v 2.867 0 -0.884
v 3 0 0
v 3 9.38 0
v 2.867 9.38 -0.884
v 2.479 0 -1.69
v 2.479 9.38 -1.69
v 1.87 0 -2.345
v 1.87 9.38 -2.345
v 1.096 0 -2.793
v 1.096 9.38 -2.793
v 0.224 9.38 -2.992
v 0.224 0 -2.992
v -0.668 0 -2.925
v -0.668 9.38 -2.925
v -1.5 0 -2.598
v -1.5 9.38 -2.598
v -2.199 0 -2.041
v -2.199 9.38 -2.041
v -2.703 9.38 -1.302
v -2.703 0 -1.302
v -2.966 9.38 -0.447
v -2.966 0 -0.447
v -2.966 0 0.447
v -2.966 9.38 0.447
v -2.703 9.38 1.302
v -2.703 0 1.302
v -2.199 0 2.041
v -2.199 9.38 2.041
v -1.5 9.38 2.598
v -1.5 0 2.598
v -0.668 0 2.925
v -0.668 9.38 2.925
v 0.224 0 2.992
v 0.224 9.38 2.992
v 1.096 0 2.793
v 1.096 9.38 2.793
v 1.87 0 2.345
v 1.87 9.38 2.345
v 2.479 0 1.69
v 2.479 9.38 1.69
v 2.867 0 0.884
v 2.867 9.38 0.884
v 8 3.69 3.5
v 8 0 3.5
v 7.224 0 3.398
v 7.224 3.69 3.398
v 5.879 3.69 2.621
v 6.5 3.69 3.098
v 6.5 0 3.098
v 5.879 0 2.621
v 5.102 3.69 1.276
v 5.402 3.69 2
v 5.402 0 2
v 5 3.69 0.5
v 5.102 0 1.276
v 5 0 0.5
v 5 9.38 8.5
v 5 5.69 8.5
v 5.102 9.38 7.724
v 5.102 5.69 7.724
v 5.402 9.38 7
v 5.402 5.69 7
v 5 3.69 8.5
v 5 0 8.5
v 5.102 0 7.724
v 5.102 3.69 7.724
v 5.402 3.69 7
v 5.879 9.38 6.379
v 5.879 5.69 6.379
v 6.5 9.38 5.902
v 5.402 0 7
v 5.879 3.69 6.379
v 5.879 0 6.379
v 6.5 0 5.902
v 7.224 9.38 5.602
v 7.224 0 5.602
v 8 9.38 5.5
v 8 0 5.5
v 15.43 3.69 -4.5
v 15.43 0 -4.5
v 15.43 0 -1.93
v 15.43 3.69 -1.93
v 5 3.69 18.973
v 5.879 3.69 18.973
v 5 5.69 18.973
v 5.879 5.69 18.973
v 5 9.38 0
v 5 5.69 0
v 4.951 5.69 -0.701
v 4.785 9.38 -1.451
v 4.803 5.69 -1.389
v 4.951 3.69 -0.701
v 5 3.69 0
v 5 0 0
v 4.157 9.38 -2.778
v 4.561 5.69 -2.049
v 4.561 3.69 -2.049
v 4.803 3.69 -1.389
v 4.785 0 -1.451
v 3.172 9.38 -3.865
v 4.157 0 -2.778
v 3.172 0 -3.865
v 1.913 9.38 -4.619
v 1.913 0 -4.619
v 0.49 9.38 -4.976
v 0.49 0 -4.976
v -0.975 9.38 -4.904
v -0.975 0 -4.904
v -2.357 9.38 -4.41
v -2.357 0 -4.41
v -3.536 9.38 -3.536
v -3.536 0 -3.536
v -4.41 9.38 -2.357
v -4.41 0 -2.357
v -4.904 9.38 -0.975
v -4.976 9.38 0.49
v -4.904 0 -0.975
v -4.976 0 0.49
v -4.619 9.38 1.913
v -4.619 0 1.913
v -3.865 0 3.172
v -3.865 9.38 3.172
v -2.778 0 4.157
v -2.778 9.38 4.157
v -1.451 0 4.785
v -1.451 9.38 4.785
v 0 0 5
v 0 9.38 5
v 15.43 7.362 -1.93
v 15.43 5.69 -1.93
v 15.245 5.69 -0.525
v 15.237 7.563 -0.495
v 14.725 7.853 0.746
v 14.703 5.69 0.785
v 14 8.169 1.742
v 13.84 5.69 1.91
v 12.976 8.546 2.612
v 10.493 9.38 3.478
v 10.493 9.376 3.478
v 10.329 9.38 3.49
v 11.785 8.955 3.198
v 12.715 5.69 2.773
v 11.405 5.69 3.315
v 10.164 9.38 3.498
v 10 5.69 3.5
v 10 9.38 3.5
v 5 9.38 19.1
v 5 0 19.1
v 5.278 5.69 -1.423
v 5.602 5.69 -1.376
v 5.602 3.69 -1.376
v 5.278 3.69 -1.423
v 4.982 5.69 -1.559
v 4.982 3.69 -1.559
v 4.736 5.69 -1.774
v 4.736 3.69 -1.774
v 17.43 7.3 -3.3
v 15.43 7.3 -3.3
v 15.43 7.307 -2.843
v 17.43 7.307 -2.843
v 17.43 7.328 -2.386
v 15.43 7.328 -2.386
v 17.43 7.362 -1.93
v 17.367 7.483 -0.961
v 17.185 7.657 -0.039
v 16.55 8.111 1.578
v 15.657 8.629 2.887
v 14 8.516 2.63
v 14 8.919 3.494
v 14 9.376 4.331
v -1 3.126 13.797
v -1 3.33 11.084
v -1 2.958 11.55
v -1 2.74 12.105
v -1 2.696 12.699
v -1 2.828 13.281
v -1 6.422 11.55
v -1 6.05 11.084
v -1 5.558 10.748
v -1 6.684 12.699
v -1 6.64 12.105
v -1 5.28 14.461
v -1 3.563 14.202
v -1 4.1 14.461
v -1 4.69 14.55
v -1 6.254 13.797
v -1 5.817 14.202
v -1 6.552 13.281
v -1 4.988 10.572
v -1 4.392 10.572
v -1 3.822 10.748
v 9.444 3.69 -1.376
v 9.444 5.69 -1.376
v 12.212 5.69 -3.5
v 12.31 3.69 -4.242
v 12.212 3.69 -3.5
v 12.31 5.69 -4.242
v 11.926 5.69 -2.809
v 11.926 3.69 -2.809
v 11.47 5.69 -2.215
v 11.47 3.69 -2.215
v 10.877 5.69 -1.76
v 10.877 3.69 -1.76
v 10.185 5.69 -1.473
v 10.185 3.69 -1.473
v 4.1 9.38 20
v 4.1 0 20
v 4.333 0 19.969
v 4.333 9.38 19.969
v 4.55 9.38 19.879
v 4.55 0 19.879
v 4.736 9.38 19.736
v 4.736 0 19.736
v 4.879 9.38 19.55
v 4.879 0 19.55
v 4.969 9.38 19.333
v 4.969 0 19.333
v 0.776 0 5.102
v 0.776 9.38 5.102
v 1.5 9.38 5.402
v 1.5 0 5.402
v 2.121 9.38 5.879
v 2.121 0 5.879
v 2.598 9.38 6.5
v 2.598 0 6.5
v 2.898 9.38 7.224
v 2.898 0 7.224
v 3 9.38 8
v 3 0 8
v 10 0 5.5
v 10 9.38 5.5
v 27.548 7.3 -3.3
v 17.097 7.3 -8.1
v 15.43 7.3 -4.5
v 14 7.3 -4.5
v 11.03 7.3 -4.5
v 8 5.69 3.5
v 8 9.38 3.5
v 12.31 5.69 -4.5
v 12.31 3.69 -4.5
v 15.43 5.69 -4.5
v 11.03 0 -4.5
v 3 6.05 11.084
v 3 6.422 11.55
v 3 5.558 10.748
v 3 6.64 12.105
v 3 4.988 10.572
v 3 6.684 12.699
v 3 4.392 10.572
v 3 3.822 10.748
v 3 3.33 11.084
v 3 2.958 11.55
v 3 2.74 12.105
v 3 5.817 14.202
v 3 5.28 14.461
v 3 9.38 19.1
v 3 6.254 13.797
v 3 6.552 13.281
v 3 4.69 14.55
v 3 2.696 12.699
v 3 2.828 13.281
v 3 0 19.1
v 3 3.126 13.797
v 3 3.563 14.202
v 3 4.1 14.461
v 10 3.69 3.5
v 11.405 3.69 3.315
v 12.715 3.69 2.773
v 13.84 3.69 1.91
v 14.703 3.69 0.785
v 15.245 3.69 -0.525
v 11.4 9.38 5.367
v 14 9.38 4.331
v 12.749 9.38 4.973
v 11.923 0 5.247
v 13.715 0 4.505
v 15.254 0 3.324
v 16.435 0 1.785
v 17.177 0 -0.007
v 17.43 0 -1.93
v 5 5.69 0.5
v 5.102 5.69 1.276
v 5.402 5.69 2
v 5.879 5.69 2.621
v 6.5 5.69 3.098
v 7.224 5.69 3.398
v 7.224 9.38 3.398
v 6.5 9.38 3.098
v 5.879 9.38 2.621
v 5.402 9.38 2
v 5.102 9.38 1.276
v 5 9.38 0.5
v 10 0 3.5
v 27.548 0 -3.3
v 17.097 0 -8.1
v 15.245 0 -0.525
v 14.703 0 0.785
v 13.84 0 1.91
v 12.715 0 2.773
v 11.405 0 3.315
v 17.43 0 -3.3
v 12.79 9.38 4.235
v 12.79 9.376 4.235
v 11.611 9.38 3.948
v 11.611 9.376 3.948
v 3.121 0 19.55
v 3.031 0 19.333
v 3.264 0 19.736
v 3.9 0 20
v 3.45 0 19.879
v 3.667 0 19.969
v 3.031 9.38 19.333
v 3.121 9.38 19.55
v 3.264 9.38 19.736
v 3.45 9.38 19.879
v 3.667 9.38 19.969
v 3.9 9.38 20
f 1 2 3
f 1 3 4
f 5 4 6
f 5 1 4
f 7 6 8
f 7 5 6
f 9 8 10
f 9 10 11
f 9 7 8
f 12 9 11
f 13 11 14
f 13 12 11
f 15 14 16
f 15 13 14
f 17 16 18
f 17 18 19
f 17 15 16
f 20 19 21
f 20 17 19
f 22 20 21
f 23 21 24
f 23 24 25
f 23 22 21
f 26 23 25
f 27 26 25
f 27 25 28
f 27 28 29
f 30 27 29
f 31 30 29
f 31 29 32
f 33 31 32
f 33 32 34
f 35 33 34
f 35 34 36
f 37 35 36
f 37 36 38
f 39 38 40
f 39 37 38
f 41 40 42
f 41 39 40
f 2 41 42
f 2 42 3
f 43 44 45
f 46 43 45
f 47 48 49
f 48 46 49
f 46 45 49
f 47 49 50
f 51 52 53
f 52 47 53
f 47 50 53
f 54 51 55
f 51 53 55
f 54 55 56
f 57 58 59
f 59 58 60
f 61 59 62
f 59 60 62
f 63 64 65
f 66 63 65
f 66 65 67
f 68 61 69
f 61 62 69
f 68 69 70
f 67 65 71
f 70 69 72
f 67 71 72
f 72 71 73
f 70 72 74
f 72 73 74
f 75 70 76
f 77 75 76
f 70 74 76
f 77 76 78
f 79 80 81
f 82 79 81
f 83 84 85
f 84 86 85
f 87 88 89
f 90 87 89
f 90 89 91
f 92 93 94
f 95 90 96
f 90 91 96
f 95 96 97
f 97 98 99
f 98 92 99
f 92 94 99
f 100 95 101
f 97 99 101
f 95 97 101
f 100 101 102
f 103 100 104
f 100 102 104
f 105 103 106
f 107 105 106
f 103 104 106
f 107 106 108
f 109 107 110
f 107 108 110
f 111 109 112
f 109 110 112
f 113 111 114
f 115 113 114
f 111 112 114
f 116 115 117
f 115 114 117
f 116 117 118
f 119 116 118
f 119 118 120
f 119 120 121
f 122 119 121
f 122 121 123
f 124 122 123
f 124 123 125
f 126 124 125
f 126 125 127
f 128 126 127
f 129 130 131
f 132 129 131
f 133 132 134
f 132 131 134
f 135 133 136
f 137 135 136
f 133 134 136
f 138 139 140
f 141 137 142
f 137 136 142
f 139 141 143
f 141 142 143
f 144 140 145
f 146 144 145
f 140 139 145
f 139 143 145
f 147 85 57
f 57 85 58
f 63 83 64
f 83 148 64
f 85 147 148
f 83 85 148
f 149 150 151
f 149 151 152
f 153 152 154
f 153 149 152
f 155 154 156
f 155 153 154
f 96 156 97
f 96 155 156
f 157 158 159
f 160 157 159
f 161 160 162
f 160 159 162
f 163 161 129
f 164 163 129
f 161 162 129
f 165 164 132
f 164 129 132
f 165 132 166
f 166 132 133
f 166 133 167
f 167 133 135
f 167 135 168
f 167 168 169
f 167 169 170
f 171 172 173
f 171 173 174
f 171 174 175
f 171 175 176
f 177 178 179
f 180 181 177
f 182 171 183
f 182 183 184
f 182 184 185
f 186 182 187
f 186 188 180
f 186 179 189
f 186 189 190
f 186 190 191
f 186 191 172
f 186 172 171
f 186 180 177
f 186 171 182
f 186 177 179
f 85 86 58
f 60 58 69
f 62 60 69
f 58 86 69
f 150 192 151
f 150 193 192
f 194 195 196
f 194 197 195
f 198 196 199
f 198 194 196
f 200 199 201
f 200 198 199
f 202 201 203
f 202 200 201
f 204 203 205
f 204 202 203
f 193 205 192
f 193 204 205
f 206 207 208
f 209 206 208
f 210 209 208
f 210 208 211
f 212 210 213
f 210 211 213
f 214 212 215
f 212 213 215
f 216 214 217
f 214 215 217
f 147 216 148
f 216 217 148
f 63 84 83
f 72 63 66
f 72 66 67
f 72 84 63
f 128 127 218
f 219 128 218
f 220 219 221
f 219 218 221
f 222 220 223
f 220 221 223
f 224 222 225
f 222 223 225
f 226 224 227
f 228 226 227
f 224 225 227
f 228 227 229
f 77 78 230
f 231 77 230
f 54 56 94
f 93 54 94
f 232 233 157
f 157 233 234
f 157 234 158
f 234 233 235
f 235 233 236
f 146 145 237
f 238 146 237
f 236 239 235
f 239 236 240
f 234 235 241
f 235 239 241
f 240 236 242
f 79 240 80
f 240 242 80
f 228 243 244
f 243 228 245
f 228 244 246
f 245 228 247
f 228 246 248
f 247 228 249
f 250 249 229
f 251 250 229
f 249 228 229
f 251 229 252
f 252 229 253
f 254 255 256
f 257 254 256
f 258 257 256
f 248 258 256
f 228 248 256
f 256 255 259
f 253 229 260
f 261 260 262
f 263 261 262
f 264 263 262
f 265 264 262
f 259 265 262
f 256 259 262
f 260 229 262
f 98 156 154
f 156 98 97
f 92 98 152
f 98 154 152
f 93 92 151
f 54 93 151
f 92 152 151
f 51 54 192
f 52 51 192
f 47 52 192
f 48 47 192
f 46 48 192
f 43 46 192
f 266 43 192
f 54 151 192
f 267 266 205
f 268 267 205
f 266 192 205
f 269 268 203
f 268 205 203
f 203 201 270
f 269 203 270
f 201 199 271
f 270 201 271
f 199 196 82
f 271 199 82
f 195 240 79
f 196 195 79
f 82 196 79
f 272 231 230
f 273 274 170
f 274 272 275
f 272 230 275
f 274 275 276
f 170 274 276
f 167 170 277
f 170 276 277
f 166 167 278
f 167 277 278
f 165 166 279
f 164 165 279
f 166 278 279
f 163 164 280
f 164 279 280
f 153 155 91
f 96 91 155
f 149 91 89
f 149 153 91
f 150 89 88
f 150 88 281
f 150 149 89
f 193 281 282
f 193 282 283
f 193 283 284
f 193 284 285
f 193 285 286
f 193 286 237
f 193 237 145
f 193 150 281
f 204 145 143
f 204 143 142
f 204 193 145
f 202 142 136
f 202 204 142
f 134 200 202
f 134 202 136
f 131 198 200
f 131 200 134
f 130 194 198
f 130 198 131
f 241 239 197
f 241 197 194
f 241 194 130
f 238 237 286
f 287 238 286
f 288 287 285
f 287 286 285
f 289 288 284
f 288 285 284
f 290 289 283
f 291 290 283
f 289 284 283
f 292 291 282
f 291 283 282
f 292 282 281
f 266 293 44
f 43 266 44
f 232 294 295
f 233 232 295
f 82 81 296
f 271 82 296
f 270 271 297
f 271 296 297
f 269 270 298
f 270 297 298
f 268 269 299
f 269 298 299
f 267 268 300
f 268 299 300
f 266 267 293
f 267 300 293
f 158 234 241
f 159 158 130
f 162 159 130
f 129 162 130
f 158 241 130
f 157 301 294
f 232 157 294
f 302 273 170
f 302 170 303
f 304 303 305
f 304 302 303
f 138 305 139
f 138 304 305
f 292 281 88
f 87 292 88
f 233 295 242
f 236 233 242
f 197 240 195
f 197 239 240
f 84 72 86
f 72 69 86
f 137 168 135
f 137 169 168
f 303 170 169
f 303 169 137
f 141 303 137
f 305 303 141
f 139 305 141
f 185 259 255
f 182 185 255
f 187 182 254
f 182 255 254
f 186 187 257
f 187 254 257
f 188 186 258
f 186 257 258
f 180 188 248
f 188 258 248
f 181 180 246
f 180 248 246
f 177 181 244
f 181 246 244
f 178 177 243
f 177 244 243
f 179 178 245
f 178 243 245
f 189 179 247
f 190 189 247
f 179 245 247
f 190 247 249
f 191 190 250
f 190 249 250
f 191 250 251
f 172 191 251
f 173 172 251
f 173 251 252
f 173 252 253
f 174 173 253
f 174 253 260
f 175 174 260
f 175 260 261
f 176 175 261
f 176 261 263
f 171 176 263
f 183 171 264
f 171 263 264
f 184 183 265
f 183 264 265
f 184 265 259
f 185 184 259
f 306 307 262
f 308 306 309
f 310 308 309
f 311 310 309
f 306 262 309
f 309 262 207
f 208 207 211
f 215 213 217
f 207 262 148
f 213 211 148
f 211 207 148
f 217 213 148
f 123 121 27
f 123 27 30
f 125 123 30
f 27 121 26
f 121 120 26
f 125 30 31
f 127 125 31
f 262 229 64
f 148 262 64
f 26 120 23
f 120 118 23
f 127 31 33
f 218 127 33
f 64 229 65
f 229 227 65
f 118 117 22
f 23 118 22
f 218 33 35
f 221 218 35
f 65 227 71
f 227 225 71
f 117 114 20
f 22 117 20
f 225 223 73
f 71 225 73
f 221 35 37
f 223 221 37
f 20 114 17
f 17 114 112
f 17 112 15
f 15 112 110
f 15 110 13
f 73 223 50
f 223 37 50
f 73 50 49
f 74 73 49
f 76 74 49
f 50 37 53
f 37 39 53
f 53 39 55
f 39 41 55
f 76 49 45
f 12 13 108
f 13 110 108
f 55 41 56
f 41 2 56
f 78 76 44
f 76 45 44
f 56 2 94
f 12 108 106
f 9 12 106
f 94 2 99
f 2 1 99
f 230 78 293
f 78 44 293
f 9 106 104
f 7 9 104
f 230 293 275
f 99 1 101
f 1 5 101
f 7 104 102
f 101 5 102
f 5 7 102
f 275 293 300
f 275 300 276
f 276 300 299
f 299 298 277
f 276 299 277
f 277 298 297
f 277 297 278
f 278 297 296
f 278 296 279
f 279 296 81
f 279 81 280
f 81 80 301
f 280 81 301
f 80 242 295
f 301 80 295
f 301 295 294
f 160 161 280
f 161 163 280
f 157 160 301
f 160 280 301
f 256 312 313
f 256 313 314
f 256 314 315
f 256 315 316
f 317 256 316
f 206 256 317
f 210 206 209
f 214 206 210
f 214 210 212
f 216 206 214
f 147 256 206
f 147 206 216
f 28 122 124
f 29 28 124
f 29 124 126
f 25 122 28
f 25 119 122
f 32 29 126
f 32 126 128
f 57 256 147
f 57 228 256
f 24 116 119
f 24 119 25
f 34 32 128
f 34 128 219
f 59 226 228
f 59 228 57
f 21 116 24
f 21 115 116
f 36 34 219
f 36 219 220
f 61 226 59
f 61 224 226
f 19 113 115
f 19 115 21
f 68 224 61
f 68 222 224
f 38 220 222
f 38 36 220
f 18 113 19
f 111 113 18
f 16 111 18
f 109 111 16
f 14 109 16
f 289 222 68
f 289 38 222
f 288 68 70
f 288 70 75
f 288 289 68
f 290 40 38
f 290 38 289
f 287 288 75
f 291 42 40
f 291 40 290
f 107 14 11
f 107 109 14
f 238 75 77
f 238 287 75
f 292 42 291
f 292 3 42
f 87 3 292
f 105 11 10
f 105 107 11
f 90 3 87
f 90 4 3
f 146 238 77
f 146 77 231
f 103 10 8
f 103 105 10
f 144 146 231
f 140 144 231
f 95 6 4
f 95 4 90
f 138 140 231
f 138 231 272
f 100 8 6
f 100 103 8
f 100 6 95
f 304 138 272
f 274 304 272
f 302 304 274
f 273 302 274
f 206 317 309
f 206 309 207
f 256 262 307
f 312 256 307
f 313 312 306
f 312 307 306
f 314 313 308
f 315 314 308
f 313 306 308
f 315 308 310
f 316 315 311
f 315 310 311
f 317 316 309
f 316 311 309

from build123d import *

# Parameters (mm, degrees)
SKETCH1_R           = 3
BOSS_EXTRUDE1_DEPTH = 9.38
BOSS_EXTRUDE2_DEPTH = 1
SKETCH5_R           = 2
BOSS_EXTRUDE3_DEPTH = 4
BOSS_EXTRUDE4_DEPTH = 1
CUT_EXTRUDE1_DEPTH  = 15
SKETCH8_W           = 1.762177923
SKETCH8_H           = 2.08
CUT_EXTRUDE2_DEPTH  = 5
CUT_REVOLVE2_ANGLE  = 180


with BuildPart() as part:
    # Sketch1 → Boss-Extrude1 (new body)
    with BuildSketch(Plane(origin=(0, 0, 0), x_dir=(1, 0, 0), z_dir=(0, 1, 0))):
        with BuildLine():
            Line((3, -8), (3, -19.1))
            ThreePointArc((3, -19.1), (3.263603897, -19.736396103), (3.9, -20))
            Line((3.9, -20), (4.1, -20))
            ThreePointArc((4.1, -20), (4.736396103, -19.736396103), (5, -19.1))
            Line((5, -19.1), (5, -8.5))
            ThreePointArc((5, -8.5), (5.878679656, -6.378679656), (8, -5.5))
            Line((8, -5.5), (10, -5.5))
            ThreePointArc((10, -5.5), (15.253803384, -3.323803384), (17.43, 1.93))
            Line((17.43, 1.93), (17.43, 3.3))
            Line((17.43, 3.3), (27.54785059, 3.3))
            Line((27.54785059, 3.3), (17.097491745, 8.1))
            Line((17.097491745, 8.1), (11.03, 4.5))
            Line((11.03, 4.5), (15.43, 4.5))
            Line((15.43, 4.5), (15.43, 1.93))
            ThreePointArc((15.43, 1.93), (13.839589822, -1.909589822), (10, -3.5))
            Line((10, -3.5), (8, -3.5))
            ThreePointArc((8, -3.5), (5.878679656, -2.621320344), (5, -0.5))
            Line((5, -0.5), (5, 0))
            ThreePointArc((5, 0), (-3.535533906, 3.535533906), (0, -5))
            ThreePointArc((0, -5), (2.121320344, -5.878679656), (3, -8))
        make_face()
        Circle(SKETCH1_R, mode=Mode.SUBTRACT)
    extrude(amount=BOSS_EXTRUDE1_DEPTH)

    # Sketch3 → Boss-Extrude2 (add, symmetric)
    with BuildSketch(Plane(origin=(0, 4.69, 0), x_dir=(1, 0, 0), z_dir=(0, 1, 0))):
        with BuildLine():
            Line((9.443635769, 1.375812361), (5.601654611, 1.375812361))
            ThreePointArc((5.601654611, 1.375812361), (4.981779837, 1.558852726), (4.560762938, 2.04925387))
            ThreePointArc((4.560762938, 2.04925387), (4.888957695, 1.047899163), (5, 0))
            Line((5, 0), (5, -0.5))
            ThreePointArc((5, -0.5), (5.878679656, -2.621320344), (8, -3.5))
            Line((8, -3.5), (10, -3.5))
            ThreePointArc((10, -3.5), (13.839589822, -1.909589822), (15.43, 1.93))
            Line((15.43, 1.93), (15.43, 4.5))
            Line((15.43, 4.5), (12.309861007, 4.5))
            Line((12.309861007, 4.5), (12.309861007, 4.242037598))
            ThreePointArc((12.309861007, 4.242037598), (11.470363071, 2.215310296), (9.443635769, 1.375812361))
        make_face()
    extrude(amount=BOSS_EXTRUDE2_DEPTH, both=True)

    # Sketch5 → Boss-Extrude3 (add)
    with BuildSketch(Plane.ZY.offset(-3)):
        with Locations((12.55, 4.69)):
            Circle(SKETCH5_R)
    extrude(amount=BOSS_EXTRUDE3_DEPTH)

    # Sketch6 → Boss-Extrude4 (add, symmetric)
    with BuildSketch(Plane(origin=(0, 4.69, 0), x_dir=(1, 0, 0), z_dir=(0, 1, 0))):
        with BuildLine():
            ThreePointArc((5, -8.5), (5.228361402, -7.351949703), (5.878679656, -6.378679656))
            Line((5.878679656, -6.378679656), (5.878679656, -18.972831199))
            Line((5.878679656, -18.972831199), (5, -18.972831199))
            Line((5, -18.972831199), (5, -8.5))
        make_face()
    extrude(amount=BOSS_EXTRUDE4_DEPTH, both=True)

    # Sketch7 → Cut-Extrude1 (cut)
    with BuildSketch(Plane(origin=(14, 0, 0), x_dir=(0, 0, -1), z_dir=(1, 0, 0))):
        with BuildLine():
            Line((-4.338573914, 9.38), (3.3, 22.365916212))
            Line((3.3, 22.365916212), (8.1, 10.195783218))
            Line((8.1, 10.195783218), (8.1, 7.3))
            Line((8.1, 7.3), (3.3, 7.3))
            ThreePointArc((3.3, 7.3), (-0.658352291, 7.829297677), (-4.338573914, 9.38))
        make_face()
    extrude(amount=CUT_EXTRUDE1_DEPTH, mode=Mode.SUBTRACT)

    # Sketch8 → Cut-Extrude2 (cut)
    with BuildSketch(Plane(origin=(14, 0, 0), x_dir=(0, 0, -1), z_dir=(1, 0, 0))):
        with Locations((5.381088961, 8.34)):
            Rectangle(SKETCH8_W, SKETCH8_H)
    extrude(amount=-CUT_EXTRUDE2_DEPTH, mode=Mode.SUBTRACT)

    # Sketch12 → Cut-Revolve2 (revolve, cut)
    with BuildSketch(Plane(origin=(14, 0, 0), x_dir=(0, 0, -1), z_dir=(1, 0, 0))):
        with BuildLine():
            Line((-1.74217919, 9.38), (-1.74217919, 8.168794661))
            ThreePointArc((-1.74217919, 8.168794661), (-3.065452427, 8.710776275), (-4.331381637, 9.375772039))
            Line((-4.331381637, 9.375772039), (-4.331381637, 10.213200203))
            Line((-4.331381637, 10.213200203), (-1.74217919, 10.213200203))
            Line((-1.74217919, 10.213200203), (-1.74217919, 9.38))
        make_face()
    revolve(axis=Axis((14, 22.365916212, -3.3), (0, -1, 0)), revolution_arc=CUT_REVOLVE2_ANGLE, mode=Mode.SUBTRACT)


solid = part.part
